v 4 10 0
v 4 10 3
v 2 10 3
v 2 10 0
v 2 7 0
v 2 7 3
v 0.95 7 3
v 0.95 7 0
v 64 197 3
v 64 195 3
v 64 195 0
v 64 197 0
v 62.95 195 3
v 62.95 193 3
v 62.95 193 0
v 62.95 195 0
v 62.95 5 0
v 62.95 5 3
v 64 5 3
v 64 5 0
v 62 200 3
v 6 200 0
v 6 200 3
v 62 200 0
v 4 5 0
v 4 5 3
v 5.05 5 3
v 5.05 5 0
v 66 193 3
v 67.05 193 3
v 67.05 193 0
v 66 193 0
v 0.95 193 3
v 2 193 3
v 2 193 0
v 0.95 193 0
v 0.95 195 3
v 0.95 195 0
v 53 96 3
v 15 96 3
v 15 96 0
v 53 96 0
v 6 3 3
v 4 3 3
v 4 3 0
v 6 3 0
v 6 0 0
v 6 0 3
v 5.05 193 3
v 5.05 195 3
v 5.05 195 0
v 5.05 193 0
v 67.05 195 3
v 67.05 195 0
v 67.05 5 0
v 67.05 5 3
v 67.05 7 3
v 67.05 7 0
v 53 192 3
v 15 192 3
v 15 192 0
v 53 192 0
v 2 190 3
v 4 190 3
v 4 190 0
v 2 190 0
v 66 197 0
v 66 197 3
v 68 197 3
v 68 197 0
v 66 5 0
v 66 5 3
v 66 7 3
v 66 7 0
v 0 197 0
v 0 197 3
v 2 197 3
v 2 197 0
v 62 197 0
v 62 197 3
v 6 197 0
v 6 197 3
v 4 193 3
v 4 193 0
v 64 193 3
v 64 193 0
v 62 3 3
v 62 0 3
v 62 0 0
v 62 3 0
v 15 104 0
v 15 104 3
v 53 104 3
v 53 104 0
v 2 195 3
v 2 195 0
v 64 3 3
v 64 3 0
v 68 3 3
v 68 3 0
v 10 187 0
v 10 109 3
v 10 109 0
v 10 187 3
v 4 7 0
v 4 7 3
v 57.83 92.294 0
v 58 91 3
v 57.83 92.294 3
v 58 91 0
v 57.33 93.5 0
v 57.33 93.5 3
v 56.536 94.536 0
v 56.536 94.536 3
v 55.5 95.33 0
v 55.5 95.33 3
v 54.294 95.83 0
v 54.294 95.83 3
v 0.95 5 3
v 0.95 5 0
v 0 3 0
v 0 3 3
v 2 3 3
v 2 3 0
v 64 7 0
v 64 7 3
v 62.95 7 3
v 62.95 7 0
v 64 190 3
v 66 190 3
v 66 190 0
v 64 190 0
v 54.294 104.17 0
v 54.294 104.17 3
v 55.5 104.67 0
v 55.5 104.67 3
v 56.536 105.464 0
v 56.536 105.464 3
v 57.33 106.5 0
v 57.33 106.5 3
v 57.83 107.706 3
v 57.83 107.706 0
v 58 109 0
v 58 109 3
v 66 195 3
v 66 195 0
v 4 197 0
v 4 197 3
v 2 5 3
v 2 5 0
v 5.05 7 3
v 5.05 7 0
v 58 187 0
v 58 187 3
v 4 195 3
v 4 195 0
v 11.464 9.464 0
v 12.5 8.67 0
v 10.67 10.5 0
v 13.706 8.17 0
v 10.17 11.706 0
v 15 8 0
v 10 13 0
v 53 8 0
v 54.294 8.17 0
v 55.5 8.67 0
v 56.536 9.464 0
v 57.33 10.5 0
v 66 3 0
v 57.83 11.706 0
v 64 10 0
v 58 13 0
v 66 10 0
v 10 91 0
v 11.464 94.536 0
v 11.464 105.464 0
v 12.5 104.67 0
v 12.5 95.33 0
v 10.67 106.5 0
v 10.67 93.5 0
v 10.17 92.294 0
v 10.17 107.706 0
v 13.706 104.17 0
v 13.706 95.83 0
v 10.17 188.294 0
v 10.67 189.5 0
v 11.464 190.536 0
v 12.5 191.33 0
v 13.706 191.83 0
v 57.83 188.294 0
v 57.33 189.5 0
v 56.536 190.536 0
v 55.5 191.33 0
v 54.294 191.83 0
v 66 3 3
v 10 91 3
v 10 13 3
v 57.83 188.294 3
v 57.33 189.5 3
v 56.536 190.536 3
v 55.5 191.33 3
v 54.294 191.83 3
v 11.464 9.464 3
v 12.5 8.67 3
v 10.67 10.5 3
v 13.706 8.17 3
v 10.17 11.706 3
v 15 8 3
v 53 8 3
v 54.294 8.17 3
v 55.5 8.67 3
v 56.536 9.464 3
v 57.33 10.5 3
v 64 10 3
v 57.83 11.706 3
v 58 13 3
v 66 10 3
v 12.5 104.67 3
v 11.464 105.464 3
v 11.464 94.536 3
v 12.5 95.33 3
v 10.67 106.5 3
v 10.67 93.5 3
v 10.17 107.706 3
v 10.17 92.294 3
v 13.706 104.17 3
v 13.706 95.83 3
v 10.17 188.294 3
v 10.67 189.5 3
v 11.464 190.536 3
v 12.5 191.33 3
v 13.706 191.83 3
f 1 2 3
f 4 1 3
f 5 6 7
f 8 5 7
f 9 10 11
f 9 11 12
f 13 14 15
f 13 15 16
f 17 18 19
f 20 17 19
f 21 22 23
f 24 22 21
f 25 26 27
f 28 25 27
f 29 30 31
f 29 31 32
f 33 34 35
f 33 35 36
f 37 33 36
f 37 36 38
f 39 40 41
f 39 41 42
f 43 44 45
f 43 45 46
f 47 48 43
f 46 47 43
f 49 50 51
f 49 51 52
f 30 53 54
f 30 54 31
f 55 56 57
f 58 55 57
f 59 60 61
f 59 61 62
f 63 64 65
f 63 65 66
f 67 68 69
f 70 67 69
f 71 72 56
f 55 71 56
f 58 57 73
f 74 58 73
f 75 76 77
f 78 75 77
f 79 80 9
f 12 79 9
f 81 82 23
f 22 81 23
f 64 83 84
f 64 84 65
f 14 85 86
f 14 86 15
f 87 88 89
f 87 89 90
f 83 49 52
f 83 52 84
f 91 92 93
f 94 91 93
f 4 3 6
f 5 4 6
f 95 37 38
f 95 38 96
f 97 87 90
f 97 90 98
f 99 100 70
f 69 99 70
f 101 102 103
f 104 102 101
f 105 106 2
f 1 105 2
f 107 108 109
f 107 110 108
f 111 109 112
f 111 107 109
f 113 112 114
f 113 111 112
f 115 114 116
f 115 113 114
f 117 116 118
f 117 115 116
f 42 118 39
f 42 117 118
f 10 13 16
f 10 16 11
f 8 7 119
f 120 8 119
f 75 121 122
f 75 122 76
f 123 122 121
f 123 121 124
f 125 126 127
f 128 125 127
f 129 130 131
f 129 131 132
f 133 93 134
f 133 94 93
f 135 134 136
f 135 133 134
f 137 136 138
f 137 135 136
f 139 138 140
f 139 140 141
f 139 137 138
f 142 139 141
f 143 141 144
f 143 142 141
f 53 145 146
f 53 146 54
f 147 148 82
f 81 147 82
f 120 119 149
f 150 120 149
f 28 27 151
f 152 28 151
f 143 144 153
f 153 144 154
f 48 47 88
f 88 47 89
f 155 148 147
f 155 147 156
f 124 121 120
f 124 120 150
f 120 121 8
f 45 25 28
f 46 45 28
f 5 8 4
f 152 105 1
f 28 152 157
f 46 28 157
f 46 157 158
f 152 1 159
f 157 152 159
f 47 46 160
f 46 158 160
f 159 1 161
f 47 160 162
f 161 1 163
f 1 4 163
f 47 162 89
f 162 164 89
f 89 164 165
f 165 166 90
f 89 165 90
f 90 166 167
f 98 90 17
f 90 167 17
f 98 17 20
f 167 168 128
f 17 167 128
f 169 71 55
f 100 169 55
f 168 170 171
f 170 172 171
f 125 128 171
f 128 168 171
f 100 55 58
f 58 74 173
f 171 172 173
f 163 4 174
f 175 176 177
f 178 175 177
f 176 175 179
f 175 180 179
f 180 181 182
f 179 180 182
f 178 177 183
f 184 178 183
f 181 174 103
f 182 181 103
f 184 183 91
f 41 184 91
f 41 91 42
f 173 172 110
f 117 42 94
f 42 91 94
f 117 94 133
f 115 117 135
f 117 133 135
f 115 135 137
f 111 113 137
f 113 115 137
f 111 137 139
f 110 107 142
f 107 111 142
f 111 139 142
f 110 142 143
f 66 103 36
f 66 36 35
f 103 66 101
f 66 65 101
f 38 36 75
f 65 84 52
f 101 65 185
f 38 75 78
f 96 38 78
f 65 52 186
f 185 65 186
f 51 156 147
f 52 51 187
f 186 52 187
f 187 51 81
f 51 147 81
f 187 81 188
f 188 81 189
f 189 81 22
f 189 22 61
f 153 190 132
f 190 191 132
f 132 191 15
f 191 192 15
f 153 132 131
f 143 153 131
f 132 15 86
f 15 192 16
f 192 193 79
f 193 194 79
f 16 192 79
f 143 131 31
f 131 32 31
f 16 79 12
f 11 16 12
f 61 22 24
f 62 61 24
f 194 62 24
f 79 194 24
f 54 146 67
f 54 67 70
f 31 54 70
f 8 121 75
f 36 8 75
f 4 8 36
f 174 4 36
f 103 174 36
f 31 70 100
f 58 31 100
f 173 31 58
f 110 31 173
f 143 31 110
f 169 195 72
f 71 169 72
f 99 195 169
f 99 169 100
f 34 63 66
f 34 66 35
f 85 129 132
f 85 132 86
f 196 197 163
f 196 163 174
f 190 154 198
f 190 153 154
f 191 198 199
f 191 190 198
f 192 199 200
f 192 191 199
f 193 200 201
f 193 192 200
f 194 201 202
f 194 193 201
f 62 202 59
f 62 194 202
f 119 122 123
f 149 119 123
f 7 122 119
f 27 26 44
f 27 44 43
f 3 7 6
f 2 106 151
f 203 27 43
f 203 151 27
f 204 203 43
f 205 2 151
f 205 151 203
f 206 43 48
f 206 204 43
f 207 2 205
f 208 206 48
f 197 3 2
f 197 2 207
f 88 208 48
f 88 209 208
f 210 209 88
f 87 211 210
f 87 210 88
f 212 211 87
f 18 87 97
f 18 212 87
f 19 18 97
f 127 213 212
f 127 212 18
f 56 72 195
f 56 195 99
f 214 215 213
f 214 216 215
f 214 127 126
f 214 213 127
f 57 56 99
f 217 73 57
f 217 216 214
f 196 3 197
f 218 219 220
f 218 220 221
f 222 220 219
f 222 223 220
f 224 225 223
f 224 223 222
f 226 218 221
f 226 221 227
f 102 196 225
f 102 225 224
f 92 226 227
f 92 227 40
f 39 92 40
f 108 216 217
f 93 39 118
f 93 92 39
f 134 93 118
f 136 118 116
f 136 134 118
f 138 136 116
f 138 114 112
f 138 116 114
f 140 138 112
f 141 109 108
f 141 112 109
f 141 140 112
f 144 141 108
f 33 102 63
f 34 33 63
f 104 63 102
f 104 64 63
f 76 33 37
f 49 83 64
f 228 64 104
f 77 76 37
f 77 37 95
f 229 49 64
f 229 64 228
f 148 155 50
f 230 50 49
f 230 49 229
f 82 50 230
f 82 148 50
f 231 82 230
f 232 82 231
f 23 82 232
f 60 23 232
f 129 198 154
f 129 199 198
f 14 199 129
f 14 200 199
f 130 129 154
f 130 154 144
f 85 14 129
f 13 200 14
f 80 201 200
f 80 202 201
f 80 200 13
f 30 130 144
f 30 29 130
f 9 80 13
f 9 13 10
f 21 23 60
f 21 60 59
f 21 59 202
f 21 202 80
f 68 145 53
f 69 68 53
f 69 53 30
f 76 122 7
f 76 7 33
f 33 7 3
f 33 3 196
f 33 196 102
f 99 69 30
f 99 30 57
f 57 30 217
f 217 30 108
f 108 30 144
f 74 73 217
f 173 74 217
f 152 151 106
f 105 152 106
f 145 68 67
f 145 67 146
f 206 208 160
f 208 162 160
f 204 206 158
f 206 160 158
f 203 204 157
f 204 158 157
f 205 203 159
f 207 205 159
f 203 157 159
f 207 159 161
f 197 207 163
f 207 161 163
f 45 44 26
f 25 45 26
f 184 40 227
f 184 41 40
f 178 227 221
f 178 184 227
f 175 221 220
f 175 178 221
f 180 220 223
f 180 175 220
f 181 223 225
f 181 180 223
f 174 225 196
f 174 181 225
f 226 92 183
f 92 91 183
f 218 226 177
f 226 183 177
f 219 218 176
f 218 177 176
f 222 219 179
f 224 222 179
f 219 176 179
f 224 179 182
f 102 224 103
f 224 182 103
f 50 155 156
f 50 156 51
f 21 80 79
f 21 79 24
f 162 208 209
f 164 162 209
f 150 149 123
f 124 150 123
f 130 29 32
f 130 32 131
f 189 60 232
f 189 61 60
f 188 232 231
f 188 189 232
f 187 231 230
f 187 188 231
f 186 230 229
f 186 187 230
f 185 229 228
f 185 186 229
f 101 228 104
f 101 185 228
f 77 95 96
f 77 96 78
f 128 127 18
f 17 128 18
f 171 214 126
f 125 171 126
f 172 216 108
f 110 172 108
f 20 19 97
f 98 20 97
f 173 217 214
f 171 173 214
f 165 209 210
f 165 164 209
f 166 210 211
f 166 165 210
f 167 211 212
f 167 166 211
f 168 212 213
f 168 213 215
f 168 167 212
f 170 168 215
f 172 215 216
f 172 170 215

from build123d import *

# Parameters (mm, degrees)
SKETCH_1_W             = 68
SKETCH_1_H             = 200
EXTRUDE_1_DEPTH        = 3
SKETCH_2_W             = 6
SKETCH_2_H             = 3
CUT_EXTRUDE_1_DEPTH    = 212.265236137
SKETCH_3_W             = 48
SKETCH_3_H             = 88
CUT_EXTRUDE_2_DEPTH    = 212.265236137
FILLET_1_R             = 5
CUT_EXTRUDE_3_DEPTH    = 212.265236137
PATTERN_LINEAR_1_COUNT = 2
PATTERN_LINEAR_1_PITCH = 62
MIRROR_1_COPY_1_DEPTH  = 212.265236137


with BuildPart() as part:
    # 草图1 → 凸台-拉伸1 (new body)
    with BuildSketch(Plane.XY):
        with Locations((34, 100)):
            Rectangle(SKETCH_1_W, SKETCH_1_H)
    extrude(amount=EXTRUDE_1_DEPTH)

    # 草图2 → 切除-拉伸1 (cut, through all)
    with BuildSketch(Plane.XY.offset(3)):
        with Locations((65, 198.5)):
            Rectangle(SKETCH_2_W, SKETCH_2_H)
        with Locations((3, 198.5)):
            Rectangle(SKETCH_2_W, SKETCH_2_H)
        with Locations((65, 1.5)):
            Rectangle(SKETCH_2_W, SKETCH_2_H)
        with Locations((3, 1.5)):
            Rectangle(SKETCH_2_W, SKETCH_2_H)
    extrude(amount=-CUT_EXTRUDE_1_DEPTH, mode=Mode.SUBTRACT)

    # 草图3 → 切除-拉伸2 (cut, through all)
    with BuildSketch(Plane.XY.offset(3)):
        with Locations((34, 148)):
            Rectangle(SKETCH_3_W, SKETCH_3_H)
        with Locations((34, 52)):
            Rectangle(SKETCH_3_W, SKETCH_3_H)
    extrude(amount=-CUT_EXTRUDE_2_DEPTH, mode=Mode.SUBTRACT)

    # 圆角1
    fillet_1_edges = [part.edges().sort_by_distance(p)[0] for p in [
        (58, 192, 1.5),
        (58, 104, 1.5),
        (10, 104, 1.5),
        (10, 192, 1.5),
        (58, 96, 1.5),
        (58, 8, 1.5),
        (10, 8, 1.5),
        (10, 96, 1.5),
    ]]
    fillet(fillet_1_edges, radius=FILLET_1_R)

    # 草图4 → 切除-拉伸3 (cut, through all)
    with BuildSketch(Plane.XY.offset(3)):
        Polygon((2, 3), (4, 3), (4, 5), (5.05, 5), (5.05, 7), (4, 7), (4, 10), (2, 10), (2, 7), (0.95, 7), (0.95, 5), (2, 5), align=None)
    cut_extrude_3 = extrude(amount=-CUT_EXTRUDE_3_DEPTH, mode=Mode.SUBTRACT)

    # 阵列(线性)1: 切除-拉伸3 ×2
    with Locations(*[(i * PATTERN_LINEAR_1_PITCH, 0, 0) for i in range(1, PATTERN_LINEAR_1_COUNT)]):
        add(cut_extrude_3, mode=Mode.SUBTRACT)

    # 镜向1: 切除-拉伸3 across plane
    add(cut_extrude_3.mirror(Plane(origin=(0, 100, 0), x_dir=(0, 0, 1), z_dir=(0, -1, 0))), mode=Mode.SUBTRACT)

    # 镜向1 copy 1 sketch → 镜向1 copy 1 (cut, through all)
    with BuildSketch(Plane(origin=(62, 200, 3), x_dir=(1, 0, 0), z_dir=(0, 0, 1))):
        Polygon((2, -3), (4, -3), (4, -5), (5.05, -5), (5.05, -7), (4, -7), (4, -10), (2, -10), (2, -7), (0.95, -7), (0.95, -5), (2, -5), align=None)
    extrude(amount=-MIRROR_1_COPY_1_DEPTH, mode=Mode.SUBTRACT)


solid = part.part
